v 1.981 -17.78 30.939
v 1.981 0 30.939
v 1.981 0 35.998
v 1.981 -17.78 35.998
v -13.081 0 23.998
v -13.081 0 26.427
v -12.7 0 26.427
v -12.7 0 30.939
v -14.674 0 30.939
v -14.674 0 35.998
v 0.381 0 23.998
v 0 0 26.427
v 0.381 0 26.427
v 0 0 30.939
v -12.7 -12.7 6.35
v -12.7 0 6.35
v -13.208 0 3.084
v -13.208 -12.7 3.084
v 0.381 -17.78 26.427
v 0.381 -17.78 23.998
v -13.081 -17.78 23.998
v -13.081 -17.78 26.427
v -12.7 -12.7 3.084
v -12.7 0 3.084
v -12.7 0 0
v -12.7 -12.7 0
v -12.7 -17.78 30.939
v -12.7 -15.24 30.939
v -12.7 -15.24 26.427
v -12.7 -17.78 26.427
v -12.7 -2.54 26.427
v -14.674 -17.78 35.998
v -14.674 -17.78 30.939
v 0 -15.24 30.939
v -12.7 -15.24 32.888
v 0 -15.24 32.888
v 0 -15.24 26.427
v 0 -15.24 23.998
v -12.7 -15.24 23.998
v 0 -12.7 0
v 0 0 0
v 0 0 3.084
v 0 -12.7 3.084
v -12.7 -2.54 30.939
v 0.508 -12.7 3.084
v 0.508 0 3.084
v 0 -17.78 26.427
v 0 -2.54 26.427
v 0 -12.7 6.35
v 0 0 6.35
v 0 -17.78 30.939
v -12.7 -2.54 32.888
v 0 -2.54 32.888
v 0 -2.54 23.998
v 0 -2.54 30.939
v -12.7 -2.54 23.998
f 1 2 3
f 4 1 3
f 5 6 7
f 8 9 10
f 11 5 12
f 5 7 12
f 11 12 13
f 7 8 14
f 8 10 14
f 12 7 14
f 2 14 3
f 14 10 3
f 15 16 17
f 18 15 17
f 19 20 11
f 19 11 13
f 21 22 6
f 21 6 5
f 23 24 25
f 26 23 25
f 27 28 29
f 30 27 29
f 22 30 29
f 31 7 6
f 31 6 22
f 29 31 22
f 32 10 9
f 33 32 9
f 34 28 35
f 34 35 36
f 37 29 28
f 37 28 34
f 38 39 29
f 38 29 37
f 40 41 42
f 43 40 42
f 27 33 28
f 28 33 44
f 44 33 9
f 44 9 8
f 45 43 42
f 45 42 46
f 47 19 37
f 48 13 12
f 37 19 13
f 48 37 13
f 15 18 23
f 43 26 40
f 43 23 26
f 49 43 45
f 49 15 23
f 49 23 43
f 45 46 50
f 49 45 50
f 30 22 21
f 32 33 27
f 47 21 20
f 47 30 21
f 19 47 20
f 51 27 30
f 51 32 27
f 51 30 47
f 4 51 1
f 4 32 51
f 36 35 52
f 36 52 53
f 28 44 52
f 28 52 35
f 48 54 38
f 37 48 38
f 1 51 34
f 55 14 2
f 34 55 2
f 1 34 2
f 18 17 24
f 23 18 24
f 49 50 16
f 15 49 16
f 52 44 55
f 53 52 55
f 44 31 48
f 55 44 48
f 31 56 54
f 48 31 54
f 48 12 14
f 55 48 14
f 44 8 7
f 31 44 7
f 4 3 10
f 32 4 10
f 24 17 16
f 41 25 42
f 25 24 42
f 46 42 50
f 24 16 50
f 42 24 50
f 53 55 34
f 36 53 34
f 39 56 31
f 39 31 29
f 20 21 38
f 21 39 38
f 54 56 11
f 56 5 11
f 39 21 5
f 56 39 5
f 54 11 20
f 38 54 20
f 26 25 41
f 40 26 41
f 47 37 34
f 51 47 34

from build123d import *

# Parameters (mm, degrees)
F1_DEPTH = 12.7
F3_DEPTH = 17.78
F4_W     = 12.7
F4_H     = 12.7
F5_DEPTH = 8.89


with BuildPart() as f1:
    # F0 (on Front) → F1 (new body)
    with BuildSketch(Plane.XZ):
        Polygon((-12.7, 0), (0, 0), (0, 3.083747), (0.508, 3.083747), (0, 6.35), (-12.7, 6.35), (-13.208, 3.083747), (-12.7, 3.083747), align=None)
    extrude(amount=F1_DEPTH)


with BuildPart() as f3:
    # F2 (on Front) → F3 (new body)
    with BuildSketch(Plane.XZ):
        Polygon((-12.7, 23.998495), (0, 23.998495), (0.381, 23.998495), (0.381, 26.426982), (0, 26.426982), (0, 30.939251), (1.9812, 30.939251), (1.9812, 35.997743), (-14.674127, 35.997743), (-14.674127, 30.939251), (-12.7, 30.939251), (-12.7, 26.426982), (-13.081, 26.426982), (-13.081, 23.998495), align=None)
    extrude(amount=F3_DEPTH)

    # F4 (on face) → F5 (cut)
    with BuildSketch(Plane(origin=(0, 0, 23.998495), x_dir=(1, 0, 0), z_dir=(0, 0, -1))):
        with Locations((-6.35, 8.89)):
            Rectangle(F4_W, F4_H)
    extrude(amount=-F5_DEPTH, mode=Mode.SUBTRACT)


solid = Compound([f1.part, f3.part])
